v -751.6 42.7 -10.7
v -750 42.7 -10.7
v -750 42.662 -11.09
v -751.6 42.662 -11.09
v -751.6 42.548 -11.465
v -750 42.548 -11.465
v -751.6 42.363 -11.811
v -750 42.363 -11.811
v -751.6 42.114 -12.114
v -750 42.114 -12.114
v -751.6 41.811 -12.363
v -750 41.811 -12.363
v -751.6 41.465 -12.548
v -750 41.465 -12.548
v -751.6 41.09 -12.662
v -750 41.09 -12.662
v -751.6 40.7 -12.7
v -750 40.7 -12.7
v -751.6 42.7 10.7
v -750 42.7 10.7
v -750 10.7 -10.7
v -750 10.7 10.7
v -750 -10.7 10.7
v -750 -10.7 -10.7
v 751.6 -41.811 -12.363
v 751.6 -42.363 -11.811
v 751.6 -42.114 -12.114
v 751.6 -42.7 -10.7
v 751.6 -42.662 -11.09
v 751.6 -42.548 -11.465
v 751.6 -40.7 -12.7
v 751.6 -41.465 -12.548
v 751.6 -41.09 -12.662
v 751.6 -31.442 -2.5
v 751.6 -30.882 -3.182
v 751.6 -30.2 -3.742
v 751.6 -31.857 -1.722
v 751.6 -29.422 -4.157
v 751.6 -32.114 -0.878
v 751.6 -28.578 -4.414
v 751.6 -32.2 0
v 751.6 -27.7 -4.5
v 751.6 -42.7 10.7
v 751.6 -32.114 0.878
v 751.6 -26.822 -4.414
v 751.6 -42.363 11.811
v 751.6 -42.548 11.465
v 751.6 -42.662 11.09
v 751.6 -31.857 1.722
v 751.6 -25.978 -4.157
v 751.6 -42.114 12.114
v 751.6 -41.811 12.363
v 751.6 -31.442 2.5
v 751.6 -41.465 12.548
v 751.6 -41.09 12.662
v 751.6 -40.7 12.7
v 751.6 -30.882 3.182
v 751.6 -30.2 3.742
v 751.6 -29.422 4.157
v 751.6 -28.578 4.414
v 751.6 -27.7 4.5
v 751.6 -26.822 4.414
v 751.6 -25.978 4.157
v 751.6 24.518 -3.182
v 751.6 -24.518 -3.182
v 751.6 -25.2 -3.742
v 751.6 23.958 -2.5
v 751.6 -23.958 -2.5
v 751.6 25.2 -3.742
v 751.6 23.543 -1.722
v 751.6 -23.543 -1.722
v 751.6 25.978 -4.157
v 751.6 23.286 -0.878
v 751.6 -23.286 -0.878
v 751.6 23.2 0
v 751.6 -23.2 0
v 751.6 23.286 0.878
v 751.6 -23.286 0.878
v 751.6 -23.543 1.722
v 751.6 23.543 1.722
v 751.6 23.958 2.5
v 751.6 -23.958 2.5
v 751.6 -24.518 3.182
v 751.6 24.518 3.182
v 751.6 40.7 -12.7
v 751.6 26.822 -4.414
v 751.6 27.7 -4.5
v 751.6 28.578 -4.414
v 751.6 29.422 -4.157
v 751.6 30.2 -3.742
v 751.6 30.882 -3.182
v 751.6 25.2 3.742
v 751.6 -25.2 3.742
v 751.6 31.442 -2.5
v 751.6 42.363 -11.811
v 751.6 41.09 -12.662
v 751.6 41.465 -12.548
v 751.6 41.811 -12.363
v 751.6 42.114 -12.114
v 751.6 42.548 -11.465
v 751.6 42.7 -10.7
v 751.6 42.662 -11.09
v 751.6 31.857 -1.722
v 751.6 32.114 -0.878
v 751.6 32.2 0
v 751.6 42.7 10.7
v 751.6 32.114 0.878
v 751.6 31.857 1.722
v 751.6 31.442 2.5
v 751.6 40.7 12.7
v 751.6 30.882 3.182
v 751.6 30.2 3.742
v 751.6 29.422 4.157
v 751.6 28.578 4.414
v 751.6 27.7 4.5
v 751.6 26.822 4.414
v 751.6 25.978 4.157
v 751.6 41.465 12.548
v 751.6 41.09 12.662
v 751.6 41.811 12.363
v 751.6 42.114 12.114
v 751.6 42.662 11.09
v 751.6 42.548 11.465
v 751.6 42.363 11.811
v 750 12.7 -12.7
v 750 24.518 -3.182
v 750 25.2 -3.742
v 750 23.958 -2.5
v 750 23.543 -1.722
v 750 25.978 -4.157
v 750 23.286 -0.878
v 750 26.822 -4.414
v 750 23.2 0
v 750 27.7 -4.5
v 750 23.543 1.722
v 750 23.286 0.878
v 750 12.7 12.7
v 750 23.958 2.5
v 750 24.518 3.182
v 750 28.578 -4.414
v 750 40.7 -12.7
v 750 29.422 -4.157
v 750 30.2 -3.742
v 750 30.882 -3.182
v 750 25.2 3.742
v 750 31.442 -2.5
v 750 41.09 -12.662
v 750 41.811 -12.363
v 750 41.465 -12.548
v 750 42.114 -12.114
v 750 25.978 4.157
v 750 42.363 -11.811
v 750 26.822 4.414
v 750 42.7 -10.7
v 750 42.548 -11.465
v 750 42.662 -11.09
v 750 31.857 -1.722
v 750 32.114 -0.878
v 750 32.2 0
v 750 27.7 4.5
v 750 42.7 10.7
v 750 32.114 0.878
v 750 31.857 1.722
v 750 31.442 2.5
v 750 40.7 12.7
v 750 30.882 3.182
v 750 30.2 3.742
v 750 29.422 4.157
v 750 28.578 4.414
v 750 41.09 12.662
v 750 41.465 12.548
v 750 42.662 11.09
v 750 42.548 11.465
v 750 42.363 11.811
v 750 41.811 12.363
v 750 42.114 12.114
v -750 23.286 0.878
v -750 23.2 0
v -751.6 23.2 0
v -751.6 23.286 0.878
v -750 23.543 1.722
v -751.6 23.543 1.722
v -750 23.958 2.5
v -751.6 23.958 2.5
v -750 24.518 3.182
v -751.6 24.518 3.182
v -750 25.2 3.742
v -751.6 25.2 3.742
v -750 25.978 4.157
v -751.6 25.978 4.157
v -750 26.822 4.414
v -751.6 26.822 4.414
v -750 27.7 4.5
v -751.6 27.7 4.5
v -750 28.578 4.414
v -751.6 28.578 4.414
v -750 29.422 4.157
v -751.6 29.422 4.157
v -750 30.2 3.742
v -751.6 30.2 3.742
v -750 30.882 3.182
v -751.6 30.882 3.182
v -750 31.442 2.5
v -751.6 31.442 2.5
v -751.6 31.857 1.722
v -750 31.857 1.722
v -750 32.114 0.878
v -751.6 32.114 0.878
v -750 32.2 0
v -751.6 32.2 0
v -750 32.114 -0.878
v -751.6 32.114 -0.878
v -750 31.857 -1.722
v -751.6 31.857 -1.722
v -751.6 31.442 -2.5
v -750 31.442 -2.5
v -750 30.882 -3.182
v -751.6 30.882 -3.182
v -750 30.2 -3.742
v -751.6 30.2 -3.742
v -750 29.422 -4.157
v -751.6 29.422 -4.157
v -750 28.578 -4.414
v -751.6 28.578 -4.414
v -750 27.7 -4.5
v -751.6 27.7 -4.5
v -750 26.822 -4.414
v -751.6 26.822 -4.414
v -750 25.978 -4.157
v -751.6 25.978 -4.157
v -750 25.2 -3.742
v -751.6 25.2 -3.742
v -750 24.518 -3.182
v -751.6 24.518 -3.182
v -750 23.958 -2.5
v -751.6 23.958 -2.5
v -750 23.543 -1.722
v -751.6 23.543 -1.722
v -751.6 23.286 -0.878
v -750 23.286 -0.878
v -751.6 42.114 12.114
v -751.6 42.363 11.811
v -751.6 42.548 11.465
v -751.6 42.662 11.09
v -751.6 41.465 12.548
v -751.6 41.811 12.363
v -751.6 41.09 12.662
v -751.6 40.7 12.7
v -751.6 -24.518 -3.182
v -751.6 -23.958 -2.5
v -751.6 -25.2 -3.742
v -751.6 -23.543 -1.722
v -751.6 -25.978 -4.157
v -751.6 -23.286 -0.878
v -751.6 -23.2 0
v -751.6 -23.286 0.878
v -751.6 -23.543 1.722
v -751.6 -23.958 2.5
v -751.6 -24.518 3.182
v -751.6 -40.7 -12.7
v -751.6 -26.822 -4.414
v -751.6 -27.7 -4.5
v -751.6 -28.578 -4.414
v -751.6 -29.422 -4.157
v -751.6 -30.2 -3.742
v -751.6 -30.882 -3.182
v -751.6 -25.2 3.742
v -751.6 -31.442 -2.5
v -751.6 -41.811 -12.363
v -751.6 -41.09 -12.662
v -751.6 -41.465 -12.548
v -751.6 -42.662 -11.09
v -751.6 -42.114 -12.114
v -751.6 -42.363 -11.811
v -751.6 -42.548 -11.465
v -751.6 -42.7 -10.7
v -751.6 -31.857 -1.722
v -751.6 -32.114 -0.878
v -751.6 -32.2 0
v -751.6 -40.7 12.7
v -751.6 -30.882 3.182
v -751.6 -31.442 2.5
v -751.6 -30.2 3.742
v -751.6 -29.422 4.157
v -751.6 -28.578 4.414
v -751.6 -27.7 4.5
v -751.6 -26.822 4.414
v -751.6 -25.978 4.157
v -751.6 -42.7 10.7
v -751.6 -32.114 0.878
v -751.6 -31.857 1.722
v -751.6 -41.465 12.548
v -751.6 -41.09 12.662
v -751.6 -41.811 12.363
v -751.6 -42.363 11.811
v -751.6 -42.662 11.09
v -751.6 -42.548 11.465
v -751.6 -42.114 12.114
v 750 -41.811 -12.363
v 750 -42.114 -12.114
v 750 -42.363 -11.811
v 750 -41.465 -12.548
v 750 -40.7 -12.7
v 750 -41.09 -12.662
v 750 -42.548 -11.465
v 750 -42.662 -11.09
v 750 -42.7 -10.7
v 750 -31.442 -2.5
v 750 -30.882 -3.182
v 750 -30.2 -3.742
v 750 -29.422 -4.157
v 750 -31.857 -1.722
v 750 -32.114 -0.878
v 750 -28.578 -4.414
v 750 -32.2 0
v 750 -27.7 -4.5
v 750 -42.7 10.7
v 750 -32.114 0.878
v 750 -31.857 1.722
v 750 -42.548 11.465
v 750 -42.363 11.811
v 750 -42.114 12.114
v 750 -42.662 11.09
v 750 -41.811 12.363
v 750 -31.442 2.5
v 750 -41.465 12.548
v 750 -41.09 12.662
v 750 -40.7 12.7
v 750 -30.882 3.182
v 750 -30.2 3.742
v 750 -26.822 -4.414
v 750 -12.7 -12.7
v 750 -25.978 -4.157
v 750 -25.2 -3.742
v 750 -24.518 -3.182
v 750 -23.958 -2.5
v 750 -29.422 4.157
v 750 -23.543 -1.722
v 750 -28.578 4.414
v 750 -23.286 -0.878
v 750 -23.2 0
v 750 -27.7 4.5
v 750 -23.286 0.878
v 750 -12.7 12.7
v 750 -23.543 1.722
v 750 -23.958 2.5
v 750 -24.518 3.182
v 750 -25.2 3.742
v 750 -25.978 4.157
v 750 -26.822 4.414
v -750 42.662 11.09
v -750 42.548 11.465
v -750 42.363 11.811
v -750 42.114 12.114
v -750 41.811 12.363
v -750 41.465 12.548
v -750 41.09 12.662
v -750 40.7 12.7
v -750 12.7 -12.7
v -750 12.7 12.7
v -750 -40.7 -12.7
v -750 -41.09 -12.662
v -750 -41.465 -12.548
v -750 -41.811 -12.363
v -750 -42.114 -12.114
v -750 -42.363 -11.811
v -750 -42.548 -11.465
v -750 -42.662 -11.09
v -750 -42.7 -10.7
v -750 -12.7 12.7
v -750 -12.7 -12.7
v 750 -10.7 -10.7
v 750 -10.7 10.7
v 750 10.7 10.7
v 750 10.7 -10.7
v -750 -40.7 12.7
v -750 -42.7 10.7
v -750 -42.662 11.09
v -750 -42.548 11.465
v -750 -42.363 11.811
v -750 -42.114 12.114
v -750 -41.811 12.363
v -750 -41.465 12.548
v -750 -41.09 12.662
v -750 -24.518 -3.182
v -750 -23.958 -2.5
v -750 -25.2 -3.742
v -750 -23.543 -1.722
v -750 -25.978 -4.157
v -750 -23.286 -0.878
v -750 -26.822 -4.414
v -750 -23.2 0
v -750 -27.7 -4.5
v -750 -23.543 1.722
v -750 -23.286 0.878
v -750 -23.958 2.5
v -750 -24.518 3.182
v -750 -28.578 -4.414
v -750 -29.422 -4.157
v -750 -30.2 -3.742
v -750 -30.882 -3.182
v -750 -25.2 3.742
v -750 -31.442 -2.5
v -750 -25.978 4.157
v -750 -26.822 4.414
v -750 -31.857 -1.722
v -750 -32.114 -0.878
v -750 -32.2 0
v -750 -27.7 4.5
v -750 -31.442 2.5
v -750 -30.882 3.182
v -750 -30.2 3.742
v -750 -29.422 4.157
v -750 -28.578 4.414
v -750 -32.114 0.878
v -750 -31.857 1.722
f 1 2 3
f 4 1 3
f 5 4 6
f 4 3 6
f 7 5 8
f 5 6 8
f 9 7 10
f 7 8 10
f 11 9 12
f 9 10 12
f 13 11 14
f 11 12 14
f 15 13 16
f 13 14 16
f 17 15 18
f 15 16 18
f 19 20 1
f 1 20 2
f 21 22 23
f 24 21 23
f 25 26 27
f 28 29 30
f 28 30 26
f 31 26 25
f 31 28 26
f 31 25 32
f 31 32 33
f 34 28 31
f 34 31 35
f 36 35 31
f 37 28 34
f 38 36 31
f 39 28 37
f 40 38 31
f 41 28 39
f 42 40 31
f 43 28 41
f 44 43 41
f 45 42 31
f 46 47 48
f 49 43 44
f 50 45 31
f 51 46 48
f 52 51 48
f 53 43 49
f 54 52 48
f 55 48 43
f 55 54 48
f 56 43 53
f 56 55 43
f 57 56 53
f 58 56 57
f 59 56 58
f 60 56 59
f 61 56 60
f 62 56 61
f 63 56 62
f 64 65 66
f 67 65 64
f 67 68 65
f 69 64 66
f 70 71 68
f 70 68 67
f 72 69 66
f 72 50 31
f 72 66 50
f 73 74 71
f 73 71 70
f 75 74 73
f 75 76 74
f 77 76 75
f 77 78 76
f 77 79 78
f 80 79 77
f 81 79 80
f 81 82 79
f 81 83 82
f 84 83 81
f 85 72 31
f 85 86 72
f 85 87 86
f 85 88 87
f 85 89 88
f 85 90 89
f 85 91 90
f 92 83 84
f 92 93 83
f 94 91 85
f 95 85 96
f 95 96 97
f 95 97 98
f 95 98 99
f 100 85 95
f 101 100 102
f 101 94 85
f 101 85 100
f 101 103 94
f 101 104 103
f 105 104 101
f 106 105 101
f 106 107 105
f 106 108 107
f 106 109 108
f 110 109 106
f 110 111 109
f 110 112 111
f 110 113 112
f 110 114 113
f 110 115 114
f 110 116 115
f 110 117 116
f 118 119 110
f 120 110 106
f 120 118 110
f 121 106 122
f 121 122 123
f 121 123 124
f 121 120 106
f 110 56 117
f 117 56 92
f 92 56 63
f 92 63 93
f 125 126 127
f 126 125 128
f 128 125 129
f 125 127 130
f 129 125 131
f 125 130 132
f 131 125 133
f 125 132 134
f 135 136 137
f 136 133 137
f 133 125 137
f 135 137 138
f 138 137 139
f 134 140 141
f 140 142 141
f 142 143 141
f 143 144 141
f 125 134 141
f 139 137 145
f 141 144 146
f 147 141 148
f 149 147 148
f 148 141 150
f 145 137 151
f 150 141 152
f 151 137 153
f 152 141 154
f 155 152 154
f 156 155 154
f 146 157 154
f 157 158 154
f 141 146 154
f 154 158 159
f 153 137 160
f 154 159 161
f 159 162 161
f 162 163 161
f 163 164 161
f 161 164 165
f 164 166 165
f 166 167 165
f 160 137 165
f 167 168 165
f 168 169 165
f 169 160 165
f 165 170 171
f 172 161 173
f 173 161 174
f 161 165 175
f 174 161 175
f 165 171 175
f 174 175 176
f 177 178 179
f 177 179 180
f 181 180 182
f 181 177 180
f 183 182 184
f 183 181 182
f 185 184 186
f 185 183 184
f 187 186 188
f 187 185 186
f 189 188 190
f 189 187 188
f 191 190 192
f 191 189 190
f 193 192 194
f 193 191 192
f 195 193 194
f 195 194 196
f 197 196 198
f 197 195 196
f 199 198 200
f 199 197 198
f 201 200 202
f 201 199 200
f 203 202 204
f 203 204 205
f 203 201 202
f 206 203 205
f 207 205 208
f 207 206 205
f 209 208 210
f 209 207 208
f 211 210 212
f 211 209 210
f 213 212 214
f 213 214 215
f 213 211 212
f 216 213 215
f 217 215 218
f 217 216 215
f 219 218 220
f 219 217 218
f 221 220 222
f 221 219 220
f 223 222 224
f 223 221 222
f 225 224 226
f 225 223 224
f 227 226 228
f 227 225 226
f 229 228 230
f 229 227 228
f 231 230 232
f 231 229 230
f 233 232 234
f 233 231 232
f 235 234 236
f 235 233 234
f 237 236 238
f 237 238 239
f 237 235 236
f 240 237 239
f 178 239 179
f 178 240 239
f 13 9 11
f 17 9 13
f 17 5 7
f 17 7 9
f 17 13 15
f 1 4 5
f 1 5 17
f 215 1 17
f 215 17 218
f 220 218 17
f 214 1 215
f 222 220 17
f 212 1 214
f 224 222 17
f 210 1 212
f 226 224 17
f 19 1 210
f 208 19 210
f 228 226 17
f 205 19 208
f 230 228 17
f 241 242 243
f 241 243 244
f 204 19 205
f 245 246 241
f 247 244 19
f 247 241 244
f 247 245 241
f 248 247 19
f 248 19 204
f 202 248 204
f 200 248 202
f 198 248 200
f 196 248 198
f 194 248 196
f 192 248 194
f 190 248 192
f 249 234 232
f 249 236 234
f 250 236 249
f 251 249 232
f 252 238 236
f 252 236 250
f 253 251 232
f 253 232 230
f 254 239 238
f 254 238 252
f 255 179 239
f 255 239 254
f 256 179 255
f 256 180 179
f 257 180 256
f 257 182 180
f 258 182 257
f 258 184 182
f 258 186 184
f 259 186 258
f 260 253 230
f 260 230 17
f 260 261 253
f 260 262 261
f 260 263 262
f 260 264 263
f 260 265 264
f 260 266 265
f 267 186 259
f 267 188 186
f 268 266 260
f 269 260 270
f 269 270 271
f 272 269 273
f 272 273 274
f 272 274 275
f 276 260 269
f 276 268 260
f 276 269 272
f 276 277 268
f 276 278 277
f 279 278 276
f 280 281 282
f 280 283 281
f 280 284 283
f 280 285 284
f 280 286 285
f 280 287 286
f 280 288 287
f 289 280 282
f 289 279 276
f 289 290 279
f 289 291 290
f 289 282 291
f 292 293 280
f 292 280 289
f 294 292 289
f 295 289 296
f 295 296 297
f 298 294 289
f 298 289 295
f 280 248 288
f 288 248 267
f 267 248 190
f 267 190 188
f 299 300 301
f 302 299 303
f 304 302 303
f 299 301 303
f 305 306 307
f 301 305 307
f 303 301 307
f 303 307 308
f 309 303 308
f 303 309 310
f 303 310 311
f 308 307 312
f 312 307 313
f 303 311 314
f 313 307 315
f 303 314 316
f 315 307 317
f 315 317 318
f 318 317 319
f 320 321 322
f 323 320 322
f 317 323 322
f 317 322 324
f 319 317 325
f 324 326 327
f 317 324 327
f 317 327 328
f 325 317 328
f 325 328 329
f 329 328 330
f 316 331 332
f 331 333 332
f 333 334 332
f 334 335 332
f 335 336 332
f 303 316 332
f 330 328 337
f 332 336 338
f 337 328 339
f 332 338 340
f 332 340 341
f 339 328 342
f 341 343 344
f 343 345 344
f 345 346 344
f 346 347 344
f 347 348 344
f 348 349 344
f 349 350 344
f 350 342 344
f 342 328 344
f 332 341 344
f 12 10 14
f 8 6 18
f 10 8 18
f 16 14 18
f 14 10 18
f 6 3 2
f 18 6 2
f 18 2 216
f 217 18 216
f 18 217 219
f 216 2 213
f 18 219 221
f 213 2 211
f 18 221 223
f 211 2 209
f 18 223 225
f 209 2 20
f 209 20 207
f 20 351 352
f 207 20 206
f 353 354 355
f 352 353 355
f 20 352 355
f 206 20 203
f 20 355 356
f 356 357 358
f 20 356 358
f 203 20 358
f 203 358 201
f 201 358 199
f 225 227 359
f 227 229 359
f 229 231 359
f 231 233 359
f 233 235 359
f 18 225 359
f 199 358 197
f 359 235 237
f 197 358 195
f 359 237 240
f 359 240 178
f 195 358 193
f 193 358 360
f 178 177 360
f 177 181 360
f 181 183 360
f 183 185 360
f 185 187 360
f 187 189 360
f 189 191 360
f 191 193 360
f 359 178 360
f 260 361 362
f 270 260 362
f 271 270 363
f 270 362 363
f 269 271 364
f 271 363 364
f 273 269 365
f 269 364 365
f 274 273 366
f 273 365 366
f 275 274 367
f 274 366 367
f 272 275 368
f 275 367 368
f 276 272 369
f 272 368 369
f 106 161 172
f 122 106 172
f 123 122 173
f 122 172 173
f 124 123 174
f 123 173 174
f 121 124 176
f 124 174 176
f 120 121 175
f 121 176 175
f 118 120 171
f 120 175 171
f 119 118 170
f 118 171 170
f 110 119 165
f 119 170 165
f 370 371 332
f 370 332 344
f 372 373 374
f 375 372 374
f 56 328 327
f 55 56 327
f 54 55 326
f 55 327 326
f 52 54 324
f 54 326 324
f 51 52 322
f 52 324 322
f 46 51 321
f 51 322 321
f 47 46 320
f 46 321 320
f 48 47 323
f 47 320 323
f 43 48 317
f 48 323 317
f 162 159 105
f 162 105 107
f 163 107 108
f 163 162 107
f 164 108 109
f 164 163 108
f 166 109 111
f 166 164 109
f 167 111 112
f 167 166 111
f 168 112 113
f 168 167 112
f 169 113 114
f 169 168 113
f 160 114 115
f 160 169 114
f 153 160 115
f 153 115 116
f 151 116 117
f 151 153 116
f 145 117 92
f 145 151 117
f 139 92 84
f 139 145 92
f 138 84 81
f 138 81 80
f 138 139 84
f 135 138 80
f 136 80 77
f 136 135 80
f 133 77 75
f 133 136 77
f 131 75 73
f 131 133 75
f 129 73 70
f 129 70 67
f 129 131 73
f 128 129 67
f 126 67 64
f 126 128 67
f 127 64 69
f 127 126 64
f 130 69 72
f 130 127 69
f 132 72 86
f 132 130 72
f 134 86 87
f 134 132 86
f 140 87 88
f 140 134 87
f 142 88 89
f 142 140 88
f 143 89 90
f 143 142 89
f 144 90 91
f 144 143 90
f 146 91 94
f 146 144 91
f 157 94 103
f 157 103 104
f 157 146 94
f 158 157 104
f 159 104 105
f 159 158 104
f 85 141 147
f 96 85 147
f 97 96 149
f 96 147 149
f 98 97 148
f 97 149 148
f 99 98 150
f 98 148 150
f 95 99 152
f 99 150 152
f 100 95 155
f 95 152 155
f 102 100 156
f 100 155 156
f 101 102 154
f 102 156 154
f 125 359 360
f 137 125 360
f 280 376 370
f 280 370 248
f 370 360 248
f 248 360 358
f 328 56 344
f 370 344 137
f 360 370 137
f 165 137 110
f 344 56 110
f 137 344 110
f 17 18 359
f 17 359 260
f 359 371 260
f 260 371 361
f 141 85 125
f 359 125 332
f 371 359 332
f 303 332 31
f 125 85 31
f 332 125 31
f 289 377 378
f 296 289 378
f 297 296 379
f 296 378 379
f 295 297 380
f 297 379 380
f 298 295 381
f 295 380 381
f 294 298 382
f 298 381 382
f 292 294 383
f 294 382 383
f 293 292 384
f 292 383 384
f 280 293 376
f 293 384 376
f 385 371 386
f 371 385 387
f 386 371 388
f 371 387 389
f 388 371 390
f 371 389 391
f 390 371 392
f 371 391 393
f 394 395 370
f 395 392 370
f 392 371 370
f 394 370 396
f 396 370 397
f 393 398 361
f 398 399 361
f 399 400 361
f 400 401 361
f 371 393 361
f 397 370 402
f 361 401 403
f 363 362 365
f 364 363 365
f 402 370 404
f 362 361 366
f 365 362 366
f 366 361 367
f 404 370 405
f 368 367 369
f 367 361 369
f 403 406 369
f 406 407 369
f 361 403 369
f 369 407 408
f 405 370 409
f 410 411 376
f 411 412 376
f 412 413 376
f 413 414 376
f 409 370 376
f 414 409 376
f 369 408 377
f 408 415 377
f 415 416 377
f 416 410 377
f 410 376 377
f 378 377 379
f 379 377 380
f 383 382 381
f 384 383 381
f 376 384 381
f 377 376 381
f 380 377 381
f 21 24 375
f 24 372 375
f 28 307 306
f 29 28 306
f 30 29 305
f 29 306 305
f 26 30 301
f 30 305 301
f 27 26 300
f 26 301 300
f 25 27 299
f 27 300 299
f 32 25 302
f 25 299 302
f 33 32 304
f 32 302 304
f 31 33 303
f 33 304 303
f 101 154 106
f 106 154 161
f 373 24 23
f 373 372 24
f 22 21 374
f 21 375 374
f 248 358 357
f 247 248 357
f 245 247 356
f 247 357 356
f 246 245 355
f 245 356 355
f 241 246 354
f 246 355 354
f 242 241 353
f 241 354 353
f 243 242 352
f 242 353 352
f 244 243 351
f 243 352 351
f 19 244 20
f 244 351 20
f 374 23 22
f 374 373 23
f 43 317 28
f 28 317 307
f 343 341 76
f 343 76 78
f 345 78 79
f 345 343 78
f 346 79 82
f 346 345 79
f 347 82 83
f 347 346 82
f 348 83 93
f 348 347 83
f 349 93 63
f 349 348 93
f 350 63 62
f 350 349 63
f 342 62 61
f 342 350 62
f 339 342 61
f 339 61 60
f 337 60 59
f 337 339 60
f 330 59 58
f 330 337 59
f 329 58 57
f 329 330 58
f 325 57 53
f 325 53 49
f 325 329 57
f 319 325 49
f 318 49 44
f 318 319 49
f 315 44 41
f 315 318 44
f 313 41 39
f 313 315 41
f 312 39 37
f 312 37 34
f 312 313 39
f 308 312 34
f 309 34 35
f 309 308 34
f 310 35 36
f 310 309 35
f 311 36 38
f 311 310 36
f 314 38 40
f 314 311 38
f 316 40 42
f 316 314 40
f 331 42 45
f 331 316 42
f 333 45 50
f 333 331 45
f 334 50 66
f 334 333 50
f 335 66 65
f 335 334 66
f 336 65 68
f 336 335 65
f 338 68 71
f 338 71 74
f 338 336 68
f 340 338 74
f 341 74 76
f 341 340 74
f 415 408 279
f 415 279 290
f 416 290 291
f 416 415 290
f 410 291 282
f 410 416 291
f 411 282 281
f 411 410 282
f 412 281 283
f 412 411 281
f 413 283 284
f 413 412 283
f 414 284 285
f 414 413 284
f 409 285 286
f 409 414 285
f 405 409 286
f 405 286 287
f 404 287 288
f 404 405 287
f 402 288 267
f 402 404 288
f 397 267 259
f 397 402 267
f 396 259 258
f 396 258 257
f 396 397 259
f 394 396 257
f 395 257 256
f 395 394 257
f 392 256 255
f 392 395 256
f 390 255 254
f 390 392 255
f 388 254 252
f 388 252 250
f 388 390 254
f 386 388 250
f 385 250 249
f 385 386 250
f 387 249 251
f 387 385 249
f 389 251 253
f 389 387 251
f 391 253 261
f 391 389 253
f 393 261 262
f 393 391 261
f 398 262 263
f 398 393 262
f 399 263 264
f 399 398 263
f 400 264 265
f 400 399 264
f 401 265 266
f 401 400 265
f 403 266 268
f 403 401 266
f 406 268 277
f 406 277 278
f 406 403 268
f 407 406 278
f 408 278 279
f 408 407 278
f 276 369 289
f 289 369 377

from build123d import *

# Parameters (mm, degrees)
F0_W     = 25.4
F0_H     = 25.4
F1_DEPTH = 750
F2_T     = -2
F3_R     = 4.5
F4_DEPTH = 1.6
F5_R     = 4.5
F6_DEPTH = 1.6


with BuildPart() as f1:
    # F0 (on Right) → F1 (new body, symmetric)
    with BuildSketch(Plane.YZ):
        Rectangle(F0_W, F0_H)
    extrude(amount=F1_DEPTH, both=True)

    # F2
    f2_openings = [f1.faces().sort_by_distance(p)[0] for p in [
        (750, 0, 0),
        (-750, 0, 0),
    ]]
    offset(amount=F2_T, openings=f2_openings)

    # F3 (on face) → F4 (join)
    with BuildSketch(Plane.YZ.offset(750)):
        with BuildLine():
            ThreePointArc((42.7, 10.7), (42.114214, 12.114214), (40.7, 12.7))
            Line((40.7, 12.7), (-40.7, 12.7))
            ThreePointArc((-40.7, 12.7), (-42.114214, 12.114214), (-42.7, 10.7))
            Line((-42.7, 10.7), (-42.7, -10.7))
            ThreePointArc((-42.7, -10.7), (-42.114214, -12.114214), (-40.7, -12.7))
            Line((-40.7, -12.7), (40.7, -12.7))
            ThreePointArc((40.7, -12.7), (42.114214, -12.114214), (42.7, -10.7))
            Line((42.7, -10.7), (42.7, 10.7))
        make_face()
        with Locations((-27.7, 0)):
            Circle(F3_R, mode=Mode.SUBTRACT)
        with Locations((27.7, 0)):
            Circle(F3_R, mode=Mode.SUBTRACT)
    extrude(amount=F4_DEPTH)

    # F5 (on face) → F6 (join)
    with BuildSketch(Plane(origin=(-750, 0, 0), x_dir=(0, -1, 0), z_dir=(-1, 0, 0))):
        with BuildLine():
            Line((-12.7, 12.7), (-40.7, 12.7))
            ThreePointArc((-40.7, 12.7), (-42.114214, 12.114214), (-42.7, 10.7))
            Line((-42.7, 10.7), (-42.7, -10.7))
            ThreePointArc((-42.7, -10.7), (-42.114214, -12.114214), (-40.7, -12.7))
            Line((-40.7, -12.7), (-12.7, -12.7))
            Line((-12.7, -12.7), (-12.7, 12.7))
        make_face()
        with Locations((-27.7, 0)):
            Circle(F5_R, mode=Mode.SUBTRACT)
        with BuildLine():
            Line((12.7, 12.7), (-12.7, 12.7))
            Line((-12.7, 12.7), (-12.7, -12.7))
            Line((-12.7, -12.7), (12.7, -12.7))
            Line((12.7, -12.7), (40.7, -12.7))
            ThreePointArc((40.7, -12.7), (42.114214, -12.114214), (42.7, -10.7))
            Line((42.7, -10.7), (42.7, 10.7))
            ThreePointArc((42.7, 10.7), (42.114214, 12.114214), (40.7, 12.7))
            Line((40.7, 12.7), (12.7, 12.7))
        make_face()
        with Locations((27.7, 0)):
            Circle(F5_R, mode=Mode.SUBTRACT)
    extrude(amount=F6_DEPTH)


solid = f1.part
